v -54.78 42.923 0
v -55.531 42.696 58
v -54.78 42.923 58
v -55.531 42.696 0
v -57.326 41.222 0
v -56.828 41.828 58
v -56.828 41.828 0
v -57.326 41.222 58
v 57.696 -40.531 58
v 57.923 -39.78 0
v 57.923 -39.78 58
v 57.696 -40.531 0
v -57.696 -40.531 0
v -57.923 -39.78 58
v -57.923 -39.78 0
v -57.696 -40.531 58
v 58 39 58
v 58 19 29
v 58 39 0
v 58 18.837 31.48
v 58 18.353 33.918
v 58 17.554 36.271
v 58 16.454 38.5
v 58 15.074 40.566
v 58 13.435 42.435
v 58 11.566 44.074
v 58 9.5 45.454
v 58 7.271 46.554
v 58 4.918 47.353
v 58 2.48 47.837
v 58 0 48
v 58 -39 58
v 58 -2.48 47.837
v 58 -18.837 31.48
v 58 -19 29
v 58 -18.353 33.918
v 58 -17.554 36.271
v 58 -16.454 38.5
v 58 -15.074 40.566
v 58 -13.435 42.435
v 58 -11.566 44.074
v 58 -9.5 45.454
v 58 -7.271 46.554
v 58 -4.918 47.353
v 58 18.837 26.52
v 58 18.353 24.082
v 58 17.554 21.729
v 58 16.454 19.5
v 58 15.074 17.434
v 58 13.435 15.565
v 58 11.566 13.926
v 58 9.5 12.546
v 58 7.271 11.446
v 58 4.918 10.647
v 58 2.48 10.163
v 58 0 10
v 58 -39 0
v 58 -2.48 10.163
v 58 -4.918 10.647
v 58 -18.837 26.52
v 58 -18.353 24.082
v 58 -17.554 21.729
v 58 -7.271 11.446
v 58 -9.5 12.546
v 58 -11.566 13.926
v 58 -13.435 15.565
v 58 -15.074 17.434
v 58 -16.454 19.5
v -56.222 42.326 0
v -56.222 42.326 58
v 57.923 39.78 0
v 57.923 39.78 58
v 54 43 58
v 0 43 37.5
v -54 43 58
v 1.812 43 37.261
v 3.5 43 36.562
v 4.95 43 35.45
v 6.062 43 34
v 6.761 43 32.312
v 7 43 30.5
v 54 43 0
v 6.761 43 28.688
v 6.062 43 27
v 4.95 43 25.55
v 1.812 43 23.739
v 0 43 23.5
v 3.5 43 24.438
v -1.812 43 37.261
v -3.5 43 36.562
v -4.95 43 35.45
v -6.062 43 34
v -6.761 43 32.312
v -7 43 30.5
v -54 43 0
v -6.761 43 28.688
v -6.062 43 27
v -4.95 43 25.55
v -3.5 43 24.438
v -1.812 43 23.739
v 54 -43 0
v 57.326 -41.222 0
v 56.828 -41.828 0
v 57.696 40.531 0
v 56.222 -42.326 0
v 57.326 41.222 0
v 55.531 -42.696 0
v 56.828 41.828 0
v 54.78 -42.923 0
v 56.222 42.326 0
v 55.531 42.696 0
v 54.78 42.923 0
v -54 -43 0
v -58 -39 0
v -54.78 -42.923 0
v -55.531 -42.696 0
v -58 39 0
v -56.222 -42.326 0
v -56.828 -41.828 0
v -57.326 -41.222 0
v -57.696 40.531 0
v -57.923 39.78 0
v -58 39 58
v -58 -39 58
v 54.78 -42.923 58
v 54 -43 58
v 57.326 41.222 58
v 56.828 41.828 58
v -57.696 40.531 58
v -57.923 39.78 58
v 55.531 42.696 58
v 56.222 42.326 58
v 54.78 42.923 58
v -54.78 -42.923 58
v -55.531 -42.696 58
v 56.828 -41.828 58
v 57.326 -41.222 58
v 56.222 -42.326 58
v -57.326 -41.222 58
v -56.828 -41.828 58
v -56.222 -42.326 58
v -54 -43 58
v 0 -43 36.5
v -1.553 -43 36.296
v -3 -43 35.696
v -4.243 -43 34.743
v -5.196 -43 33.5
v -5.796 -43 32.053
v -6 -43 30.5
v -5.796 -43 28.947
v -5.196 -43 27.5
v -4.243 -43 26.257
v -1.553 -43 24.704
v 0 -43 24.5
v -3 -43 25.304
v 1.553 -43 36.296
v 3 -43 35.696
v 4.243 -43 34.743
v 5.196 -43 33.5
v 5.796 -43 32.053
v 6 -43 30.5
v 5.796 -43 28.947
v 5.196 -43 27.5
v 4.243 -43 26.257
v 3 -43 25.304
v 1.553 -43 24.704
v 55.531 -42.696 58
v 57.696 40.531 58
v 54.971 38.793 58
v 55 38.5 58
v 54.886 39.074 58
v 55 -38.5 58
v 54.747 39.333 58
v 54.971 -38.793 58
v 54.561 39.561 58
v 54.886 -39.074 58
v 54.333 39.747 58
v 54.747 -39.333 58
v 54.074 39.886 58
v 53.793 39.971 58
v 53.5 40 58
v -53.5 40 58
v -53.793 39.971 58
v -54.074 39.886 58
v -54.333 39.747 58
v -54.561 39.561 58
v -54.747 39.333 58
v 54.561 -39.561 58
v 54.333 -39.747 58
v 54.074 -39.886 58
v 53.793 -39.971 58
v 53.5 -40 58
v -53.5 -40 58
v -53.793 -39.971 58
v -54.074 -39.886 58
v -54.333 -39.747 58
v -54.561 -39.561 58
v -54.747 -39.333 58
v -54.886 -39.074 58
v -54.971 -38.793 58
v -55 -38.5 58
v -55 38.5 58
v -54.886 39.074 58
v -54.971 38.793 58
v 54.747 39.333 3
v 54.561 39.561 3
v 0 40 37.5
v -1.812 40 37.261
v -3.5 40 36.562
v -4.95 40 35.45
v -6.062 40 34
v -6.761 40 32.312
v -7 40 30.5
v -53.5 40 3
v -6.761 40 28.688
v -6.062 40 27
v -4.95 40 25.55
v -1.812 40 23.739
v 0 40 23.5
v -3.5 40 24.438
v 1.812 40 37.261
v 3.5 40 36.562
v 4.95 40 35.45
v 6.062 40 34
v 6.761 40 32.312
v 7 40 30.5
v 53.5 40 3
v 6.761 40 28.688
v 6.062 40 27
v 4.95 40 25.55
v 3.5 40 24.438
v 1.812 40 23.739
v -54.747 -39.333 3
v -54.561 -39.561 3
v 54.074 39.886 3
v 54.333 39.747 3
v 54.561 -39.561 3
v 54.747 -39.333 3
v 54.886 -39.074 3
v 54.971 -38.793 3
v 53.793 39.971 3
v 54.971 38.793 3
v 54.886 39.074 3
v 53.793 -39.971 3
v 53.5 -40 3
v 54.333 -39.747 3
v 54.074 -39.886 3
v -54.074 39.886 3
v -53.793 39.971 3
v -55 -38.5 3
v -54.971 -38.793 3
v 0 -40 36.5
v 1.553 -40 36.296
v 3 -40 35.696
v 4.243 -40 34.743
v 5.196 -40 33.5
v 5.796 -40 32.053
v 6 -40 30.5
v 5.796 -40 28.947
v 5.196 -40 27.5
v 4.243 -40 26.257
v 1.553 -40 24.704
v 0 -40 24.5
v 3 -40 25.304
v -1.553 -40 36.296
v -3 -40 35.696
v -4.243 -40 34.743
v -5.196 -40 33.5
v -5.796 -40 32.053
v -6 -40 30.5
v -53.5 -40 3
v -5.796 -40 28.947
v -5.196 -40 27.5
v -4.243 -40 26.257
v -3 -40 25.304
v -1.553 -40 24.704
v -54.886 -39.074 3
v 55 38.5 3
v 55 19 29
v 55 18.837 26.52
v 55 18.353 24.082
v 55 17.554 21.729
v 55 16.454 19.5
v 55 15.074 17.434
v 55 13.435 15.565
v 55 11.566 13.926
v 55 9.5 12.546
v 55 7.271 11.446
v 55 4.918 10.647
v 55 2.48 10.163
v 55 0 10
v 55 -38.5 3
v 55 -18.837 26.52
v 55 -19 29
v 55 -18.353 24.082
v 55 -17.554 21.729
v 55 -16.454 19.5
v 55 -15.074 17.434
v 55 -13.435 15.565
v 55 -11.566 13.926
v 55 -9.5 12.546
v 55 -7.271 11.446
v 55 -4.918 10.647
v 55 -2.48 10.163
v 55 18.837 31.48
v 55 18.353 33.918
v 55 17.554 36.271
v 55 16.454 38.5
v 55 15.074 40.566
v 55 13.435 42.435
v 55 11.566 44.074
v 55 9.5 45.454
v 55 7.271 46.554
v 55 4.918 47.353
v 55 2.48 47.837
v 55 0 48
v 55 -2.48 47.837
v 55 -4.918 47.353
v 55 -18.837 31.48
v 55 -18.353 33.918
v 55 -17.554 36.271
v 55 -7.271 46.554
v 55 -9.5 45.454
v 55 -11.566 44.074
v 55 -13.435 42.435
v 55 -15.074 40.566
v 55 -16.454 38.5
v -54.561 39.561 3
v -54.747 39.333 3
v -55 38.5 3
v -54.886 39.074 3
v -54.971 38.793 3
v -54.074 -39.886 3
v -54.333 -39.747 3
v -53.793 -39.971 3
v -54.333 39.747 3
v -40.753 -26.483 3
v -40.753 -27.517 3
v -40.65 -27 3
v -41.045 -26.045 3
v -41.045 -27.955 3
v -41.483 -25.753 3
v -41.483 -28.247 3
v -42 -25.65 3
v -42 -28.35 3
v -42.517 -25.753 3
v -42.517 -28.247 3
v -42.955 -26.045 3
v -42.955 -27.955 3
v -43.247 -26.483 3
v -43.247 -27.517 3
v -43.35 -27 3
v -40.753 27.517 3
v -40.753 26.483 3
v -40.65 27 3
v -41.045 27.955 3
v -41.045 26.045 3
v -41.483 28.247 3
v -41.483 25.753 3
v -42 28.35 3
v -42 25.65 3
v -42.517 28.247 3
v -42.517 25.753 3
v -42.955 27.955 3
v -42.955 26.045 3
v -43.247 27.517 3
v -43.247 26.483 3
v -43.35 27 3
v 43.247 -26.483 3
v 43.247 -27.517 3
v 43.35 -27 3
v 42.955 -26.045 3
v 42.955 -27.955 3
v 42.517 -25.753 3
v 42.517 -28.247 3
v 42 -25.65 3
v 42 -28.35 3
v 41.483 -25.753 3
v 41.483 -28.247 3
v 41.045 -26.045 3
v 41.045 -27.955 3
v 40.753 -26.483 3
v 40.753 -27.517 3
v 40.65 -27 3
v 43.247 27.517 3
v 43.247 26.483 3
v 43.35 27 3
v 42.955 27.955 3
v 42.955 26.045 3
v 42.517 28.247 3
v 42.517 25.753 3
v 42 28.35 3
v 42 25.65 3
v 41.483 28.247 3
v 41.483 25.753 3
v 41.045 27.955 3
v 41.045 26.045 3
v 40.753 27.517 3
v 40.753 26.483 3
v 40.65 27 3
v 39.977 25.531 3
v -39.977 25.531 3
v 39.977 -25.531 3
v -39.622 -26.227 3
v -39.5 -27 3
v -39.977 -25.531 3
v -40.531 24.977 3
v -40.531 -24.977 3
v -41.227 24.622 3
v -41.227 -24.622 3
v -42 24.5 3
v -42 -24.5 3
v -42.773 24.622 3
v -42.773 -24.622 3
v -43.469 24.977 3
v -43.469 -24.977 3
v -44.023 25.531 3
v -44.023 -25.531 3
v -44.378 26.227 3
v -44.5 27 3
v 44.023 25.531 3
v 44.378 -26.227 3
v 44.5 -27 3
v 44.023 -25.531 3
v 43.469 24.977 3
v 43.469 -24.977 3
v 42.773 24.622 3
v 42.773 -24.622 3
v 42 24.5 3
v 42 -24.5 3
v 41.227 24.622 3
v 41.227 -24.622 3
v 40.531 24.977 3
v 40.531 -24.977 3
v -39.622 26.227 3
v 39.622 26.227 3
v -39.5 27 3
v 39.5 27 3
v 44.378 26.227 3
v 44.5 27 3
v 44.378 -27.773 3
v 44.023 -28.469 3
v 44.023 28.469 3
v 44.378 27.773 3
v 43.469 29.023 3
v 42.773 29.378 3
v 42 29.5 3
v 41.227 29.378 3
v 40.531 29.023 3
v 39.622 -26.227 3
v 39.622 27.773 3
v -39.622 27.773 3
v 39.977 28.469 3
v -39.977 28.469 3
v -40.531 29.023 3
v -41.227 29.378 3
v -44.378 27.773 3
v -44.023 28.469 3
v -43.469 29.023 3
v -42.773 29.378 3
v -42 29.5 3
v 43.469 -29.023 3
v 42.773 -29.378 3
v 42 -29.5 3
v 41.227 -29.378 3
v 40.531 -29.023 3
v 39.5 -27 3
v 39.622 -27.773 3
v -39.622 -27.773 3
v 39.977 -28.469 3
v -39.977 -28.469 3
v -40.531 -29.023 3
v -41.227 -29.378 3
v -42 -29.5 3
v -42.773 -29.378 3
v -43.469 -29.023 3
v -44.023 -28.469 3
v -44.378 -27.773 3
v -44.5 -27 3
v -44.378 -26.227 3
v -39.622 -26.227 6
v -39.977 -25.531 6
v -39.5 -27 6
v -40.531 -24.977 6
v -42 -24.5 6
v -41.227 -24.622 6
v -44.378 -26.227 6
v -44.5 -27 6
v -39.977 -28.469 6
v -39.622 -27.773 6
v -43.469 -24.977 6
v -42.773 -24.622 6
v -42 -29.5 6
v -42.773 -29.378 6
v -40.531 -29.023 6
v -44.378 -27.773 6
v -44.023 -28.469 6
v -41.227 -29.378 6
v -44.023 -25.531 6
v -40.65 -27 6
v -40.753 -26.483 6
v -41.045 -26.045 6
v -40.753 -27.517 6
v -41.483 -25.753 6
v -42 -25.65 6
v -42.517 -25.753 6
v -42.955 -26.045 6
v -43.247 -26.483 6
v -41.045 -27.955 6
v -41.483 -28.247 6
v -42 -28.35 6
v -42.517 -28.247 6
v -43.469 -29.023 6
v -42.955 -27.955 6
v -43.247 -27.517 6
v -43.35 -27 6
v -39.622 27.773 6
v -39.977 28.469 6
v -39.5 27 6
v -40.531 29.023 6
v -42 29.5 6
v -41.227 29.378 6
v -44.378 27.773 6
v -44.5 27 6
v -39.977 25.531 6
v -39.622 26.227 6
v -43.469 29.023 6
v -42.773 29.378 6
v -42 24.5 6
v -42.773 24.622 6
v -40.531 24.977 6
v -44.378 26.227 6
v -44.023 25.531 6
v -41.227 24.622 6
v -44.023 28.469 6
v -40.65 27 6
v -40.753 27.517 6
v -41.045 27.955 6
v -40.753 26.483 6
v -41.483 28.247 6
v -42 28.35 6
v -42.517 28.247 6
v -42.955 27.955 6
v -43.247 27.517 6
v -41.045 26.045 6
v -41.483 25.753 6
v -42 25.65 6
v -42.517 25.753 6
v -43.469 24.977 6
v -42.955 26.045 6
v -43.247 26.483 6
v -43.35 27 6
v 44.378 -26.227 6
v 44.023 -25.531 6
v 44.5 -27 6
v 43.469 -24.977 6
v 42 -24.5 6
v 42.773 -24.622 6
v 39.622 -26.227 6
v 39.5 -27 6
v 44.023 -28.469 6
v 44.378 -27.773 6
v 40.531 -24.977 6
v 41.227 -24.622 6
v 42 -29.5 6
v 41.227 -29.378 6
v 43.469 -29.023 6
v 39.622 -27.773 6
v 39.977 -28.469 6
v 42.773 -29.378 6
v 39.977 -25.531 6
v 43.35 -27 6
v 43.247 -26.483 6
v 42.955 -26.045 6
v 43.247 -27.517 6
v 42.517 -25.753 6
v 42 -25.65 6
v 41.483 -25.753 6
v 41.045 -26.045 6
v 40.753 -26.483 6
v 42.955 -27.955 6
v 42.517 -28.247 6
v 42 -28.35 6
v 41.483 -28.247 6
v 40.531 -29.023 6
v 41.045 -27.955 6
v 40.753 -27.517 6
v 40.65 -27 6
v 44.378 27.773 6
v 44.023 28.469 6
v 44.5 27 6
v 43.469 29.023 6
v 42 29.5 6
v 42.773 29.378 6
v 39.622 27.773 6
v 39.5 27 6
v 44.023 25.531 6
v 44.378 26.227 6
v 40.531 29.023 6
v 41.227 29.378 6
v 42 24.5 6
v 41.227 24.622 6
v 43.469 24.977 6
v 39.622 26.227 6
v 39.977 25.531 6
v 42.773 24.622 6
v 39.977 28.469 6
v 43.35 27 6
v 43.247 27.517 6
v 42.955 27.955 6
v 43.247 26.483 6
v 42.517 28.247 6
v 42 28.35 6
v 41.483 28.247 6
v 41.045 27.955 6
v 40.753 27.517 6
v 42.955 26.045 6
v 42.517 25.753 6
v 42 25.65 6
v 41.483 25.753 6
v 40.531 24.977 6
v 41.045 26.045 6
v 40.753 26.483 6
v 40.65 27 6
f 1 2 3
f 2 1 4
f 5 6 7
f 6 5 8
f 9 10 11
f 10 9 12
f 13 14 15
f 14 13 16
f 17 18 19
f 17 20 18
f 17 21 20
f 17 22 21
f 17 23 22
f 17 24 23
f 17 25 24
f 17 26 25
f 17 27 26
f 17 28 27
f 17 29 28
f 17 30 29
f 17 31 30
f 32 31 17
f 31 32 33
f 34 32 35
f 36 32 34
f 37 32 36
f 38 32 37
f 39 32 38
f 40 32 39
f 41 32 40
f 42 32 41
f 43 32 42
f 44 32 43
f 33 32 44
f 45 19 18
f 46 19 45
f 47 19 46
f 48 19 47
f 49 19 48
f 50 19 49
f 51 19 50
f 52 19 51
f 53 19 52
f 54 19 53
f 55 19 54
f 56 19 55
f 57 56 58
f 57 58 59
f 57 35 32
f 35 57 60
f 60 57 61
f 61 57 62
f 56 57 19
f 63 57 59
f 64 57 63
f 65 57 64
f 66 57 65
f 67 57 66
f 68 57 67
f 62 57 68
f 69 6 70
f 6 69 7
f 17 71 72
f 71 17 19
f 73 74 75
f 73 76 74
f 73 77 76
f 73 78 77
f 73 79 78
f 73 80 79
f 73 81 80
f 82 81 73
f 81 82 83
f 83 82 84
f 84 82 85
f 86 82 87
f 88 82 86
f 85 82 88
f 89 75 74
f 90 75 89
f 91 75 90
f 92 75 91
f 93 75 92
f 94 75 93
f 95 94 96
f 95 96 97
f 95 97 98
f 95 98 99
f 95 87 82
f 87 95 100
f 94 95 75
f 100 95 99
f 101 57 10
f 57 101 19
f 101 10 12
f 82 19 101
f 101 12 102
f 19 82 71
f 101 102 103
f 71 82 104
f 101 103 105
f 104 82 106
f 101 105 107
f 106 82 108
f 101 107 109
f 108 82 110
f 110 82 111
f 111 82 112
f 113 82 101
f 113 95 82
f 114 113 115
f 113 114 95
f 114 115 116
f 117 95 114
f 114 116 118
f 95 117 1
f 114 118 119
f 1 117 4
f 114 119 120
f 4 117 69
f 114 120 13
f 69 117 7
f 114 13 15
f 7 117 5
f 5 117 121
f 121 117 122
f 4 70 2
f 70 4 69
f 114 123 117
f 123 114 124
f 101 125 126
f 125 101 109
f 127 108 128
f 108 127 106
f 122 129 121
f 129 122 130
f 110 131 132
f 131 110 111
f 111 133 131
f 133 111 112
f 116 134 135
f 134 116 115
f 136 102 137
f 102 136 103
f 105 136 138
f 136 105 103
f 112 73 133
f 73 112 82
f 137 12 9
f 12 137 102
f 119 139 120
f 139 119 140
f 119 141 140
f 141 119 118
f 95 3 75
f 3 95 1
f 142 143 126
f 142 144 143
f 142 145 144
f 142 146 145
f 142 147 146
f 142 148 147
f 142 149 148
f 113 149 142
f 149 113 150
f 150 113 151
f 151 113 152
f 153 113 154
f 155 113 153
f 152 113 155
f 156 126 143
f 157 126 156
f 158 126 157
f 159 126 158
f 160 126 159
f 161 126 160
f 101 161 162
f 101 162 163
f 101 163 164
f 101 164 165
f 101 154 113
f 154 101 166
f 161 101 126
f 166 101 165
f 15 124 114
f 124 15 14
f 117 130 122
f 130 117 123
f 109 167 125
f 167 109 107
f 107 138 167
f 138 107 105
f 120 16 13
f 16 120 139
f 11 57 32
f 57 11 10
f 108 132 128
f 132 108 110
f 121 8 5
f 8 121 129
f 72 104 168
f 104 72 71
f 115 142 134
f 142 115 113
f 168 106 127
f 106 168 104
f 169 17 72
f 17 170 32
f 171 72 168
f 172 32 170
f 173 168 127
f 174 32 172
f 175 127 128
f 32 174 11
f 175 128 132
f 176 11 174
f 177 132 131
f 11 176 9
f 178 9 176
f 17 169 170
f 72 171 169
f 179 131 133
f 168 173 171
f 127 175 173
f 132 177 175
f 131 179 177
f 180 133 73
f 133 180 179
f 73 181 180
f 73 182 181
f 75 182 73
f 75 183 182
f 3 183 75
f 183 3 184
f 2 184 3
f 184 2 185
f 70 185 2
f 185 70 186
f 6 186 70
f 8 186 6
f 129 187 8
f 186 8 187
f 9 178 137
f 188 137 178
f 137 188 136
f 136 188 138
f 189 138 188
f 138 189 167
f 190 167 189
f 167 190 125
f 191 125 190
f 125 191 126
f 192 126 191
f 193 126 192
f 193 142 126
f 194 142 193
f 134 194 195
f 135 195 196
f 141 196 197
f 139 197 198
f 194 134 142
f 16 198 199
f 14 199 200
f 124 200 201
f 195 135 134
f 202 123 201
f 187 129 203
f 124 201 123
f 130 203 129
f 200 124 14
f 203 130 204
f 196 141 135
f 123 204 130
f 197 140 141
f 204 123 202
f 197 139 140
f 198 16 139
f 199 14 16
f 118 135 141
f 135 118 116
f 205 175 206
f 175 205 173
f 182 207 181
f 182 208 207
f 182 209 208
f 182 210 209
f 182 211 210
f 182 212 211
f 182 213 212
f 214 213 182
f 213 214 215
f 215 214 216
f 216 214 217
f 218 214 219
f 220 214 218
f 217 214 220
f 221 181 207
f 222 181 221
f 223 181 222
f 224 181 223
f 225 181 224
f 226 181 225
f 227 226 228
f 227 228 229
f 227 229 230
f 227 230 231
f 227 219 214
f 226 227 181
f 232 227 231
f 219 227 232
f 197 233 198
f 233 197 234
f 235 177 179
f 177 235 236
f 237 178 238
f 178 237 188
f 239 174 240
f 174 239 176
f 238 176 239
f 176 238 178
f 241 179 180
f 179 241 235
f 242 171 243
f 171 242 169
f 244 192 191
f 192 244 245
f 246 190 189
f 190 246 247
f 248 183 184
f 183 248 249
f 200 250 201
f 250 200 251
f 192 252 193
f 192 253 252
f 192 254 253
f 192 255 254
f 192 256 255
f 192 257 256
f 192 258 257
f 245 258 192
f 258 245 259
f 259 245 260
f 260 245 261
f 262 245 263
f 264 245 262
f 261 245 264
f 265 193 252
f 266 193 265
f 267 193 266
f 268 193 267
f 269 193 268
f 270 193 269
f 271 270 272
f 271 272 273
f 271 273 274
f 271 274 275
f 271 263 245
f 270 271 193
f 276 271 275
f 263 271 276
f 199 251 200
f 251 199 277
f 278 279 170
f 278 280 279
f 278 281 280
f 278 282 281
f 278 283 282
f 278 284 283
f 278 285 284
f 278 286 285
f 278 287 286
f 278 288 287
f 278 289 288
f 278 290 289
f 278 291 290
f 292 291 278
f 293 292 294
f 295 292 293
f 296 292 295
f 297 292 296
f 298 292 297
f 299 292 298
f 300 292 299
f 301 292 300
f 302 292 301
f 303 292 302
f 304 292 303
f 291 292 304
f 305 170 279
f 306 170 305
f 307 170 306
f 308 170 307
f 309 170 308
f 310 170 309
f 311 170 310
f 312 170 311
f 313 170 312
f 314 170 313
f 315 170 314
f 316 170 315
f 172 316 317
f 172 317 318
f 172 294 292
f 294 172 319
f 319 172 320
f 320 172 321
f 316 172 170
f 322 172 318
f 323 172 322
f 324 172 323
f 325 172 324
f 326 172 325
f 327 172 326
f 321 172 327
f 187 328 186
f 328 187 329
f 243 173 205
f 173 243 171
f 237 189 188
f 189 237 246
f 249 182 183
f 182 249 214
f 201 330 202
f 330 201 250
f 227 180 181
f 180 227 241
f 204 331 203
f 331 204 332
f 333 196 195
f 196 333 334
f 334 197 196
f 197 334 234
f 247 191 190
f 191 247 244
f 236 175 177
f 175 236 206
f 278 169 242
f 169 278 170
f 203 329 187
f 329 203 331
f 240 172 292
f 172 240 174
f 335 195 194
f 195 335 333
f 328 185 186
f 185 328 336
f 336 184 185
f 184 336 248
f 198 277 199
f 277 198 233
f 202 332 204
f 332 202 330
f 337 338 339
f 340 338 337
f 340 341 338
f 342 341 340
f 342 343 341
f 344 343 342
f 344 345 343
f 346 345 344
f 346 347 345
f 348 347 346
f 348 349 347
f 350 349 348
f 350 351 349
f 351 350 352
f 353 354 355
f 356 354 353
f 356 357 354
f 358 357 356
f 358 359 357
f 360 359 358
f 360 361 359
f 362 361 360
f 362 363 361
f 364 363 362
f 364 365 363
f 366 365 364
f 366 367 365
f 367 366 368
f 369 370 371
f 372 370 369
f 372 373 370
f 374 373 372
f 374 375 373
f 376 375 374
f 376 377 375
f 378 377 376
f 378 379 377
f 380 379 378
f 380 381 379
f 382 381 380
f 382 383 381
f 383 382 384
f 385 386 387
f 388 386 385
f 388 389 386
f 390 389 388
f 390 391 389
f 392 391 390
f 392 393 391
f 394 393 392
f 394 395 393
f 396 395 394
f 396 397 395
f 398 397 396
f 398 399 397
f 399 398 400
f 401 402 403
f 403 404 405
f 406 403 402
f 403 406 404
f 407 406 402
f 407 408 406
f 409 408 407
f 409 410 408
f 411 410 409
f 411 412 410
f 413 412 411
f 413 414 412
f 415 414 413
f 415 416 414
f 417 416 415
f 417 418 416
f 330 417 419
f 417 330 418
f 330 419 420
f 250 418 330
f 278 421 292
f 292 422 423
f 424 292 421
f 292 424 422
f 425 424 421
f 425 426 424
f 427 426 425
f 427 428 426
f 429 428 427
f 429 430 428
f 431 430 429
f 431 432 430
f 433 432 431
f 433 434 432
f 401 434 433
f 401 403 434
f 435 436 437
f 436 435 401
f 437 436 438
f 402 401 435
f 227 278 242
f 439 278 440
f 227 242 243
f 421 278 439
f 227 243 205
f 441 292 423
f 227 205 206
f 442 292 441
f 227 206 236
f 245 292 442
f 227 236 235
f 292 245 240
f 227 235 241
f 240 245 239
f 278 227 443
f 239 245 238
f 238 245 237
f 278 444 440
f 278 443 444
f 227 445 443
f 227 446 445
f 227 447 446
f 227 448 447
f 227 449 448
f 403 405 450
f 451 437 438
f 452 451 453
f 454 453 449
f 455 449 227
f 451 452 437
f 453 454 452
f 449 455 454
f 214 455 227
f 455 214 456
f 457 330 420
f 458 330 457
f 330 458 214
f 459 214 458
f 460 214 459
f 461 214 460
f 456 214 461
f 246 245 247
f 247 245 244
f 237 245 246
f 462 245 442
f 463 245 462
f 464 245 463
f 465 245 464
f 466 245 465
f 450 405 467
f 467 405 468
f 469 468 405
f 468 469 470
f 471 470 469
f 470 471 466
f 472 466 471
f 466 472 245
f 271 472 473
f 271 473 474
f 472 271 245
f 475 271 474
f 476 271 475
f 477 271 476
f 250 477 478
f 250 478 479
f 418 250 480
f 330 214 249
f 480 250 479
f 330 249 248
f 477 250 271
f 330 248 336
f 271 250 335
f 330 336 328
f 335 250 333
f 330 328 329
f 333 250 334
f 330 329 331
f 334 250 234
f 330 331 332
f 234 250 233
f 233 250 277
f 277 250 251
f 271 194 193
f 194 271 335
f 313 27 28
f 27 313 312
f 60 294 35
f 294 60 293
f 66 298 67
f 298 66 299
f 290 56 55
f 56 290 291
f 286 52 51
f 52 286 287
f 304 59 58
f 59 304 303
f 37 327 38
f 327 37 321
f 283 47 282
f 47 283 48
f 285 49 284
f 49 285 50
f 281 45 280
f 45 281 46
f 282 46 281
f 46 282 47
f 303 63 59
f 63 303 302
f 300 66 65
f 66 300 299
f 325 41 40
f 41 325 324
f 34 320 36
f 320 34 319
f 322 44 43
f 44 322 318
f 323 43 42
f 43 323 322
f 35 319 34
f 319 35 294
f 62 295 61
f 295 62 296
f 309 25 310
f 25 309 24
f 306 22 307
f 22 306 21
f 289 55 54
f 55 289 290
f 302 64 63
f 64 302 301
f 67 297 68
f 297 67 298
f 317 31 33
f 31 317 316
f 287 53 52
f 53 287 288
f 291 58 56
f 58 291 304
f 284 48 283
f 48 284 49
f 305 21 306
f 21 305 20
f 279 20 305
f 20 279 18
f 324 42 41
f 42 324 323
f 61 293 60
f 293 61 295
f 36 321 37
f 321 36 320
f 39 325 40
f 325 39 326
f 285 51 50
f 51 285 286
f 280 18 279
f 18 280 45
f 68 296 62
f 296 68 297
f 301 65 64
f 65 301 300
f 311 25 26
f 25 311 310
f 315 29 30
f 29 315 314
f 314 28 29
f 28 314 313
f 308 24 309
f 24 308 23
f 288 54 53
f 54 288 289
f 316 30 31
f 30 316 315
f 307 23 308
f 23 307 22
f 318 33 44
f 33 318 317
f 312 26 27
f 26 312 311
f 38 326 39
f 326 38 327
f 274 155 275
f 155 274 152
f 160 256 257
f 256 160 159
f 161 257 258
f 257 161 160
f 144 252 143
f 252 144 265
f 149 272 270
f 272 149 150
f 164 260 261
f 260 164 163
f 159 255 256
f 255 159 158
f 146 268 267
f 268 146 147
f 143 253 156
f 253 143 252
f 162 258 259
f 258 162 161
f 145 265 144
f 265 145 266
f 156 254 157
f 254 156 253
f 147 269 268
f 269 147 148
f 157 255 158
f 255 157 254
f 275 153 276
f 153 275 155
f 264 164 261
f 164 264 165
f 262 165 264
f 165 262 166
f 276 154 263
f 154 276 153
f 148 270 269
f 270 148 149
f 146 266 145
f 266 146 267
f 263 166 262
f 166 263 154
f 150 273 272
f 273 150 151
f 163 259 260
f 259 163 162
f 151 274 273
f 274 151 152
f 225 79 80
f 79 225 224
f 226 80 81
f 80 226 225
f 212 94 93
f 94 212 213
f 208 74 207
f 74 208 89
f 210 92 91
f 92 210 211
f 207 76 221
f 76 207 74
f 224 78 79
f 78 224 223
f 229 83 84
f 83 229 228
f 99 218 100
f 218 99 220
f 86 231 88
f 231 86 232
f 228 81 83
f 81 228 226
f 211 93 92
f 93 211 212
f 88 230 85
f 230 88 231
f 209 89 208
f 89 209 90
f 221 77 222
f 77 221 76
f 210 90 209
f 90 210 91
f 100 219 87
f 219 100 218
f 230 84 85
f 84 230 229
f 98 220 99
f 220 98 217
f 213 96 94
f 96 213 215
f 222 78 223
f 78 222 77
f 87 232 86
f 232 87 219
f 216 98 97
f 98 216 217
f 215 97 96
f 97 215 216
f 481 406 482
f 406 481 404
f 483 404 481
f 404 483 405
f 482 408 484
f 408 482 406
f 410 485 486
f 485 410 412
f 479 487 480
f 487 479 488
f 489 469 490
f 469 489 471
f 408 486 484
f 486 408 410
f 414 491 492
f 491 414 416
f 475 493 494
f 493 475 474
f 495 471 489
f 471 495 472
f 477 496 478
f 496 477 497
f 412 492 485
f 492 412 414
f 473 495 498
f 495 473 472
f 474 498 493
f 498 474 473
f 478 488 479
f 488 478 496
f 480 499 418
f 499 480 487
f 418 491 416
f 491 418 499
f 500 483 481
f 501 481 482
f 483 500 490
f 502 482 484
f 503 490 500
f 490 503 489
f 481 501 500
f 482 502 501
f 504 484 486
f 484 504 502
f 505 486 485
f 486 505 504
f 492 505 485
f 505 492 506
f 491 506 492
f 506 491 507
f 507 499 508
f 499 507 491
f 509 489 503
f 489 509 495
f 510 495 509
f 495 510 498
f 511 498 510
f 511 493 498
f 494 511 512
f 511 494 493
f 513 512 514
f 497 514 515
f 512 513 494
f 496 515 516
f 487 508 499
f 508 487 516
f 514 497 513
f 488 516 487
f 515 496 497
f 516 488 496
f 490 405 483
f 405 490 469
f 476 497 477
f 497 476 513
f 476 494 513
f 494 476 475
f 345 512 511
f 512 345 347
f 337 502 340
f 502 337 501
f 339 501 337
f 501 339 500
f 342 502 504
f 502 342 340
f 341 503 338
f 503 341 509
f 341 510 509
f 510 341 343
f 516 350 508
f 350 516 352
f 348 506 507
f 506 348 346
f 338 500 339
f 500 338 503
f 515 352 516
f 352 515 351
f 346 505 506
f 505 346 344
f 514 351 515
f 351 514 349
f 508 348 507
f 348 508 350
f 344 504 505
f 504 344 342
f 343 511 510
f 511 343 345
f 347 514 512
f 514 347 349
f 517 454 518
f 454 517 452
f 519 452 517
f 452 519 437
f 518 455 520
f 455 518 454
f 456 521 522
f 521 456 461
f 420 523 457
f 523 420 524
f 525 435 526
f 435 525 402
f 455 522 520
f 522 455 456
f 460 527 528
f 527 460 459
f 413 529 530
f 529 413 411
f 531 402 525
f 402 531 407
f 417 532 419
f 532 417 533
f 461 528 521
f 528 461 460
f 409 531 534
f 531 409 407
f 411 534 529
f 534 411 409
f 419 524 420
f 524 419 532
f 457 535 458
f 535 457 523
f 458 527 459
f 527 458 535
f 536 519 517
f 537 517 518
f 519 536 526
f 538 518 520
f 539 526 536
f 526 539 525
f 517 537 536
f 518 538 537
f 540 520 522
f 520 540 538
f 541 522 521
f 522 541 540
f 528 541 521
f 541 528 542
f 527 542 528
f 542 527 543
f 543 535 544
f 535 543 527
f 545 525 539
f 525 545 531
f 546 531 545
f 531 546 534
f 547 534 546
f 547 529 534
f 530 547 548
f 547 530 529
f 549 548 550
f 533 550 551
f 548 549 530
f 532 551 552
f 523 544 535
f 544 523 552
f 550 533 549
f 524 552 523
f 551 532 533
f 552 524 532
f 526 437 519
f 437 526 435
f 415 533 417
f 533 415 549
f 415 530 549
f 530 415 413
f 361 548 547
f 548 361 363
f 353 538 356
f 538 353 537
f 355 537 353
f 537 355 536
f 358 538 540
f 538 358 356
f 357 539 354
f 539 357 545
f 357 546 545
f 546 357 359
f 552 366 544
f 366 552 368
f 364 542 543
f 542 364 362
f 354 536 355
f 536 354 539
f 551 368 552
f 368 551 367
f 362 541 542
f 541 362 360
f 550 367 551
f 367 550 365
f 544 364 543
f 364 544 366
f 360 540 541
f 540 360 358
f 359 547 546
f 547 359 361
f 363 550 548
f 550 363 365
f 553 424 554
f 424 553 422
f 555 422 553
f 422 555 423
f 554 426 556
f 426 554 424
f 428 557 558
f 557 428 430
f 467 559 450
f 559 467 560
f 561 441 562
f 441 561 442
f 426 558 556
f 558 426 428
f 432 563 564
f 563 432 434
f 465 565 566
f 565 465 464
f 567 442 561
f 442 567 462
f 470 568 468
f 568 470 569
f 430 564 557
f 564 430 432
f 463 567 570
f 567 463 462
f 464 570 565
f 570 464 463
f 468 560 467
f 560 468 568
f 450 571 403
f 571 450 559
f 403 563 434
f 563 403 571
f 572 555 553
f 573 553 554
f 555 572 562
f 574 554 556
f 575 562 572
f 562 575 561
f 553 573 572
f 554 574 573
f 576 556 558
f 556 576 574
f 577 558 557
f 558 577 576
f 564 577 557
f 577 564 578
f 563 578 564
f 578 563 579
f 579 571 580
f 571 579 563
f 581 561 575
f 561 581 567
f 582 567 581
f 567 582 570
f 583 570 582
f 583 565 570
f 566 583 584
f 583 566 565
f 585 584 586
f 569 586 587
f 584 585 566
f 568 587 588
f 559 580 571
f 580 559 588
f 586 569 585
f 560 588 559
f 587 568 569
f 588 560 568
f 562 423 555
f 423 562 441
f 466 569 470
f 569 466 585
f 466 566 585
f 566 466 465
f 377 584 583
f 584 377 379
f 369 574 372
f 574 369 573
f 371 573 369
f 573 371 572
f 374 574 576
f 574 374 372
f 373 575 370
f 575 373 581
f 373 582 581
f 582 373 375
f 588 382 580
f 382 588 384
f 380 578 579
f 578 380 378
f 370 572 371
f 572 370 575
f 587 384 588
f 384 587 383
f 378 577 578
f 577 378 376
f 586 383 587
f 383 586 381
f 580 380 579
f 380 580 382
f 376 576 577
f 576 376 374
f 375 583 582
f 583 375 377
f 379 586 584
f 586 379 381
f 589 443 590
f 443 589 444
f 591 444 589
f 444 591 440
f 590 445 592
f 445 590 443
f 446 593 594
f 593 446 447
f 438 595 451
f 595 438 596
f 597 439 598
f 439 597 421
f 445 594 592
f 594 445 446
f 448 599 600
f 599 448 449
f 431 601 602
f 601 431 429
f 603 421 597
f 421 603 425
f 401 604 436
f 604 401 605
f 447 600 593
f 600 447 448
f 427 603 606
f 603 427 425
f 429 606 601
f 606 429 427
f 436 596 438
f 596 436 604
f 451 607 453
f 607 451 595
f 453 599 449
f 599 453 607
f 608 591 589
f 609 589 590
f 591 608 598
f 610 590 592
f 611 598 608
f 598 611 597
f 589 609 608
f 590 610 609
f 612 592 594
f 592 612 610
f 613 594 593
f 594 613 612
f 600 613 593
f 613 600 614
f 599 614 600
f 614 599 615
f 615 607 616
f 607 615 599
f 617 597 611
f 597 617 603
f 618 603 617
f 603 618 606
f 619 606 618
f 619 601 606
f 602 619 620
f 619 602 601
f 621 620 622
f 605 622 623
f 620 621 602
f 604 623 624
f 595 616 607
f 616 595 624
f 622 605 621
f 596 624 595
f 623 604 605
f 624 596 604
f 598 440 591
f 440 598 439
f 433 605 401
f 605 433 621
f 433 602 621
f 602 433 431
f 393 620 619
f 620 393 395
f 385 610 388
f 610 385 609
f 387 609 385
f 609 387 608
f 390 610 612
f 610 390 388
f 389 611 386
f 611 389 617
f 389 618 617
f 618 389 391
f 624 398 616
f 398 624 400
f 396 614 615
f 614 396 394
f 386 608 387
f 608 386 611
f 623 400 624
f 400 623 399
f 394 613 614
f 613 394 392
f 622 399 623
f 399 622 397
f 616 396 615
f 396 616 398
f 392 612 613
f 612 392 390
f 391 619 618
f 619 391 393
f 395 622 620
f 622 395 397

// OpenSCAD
// ===========================================================================
// HULL-FRAME COORDINATE STANDARD - Rev R1 (2026-06-11).  See CLAUDE.md.
//   Hull frame (canonical for ALL design artifacts): X = +port (left),
//   Y = +aft (back), Z = +dorsal (up); origin = SerenityAssembly.FCStd
//   world origin.  Primary-component STLs published to airframe/stls/
//   are stored directly in hull frame, baked by tools/bake_hull_frame.py
//   (marker 'SerenityUAV HULL-FRAME R1' in the binary STL header).
//   NEVER re-bake a mesh derived from an already-baked file.
//   This file:
//     Skipper ground-support equipment - part-local print frame.  The
//     aircraft hull-frame standard does not apply to GCS hardware
//     (documented exception, like the avionics KiCad files).
// ===========================================================================
/*
 * skipper_field_enclosure.scad
 * IP65 weatherproof field enclosure for Skipper GCS comms node
 * (PocketBeagle 2 Industrial + TACCO + XCVR-49MHZ-2 stack)
 *
 * Author:  Steve Griffing, PE(CSE), CISSP-ISSEP, CPP
 * License: CERN-OHL-W-2.0 — see LICENSES/CERN-OHL-W 2.0 (SPDX-License-Identifier: CERN-OHL-W-2.0)
 * Revision: R (2026-06-11)
 *
 * Description:
 *   Two-part (lid + body) enclosure for Skipper's comms node.  The interior
 *   fits the PB2-I + TACCO + XCVR-49MHZ-2 stack on standoffs, a 40 mm
 *   cooling fan, and cable gland locations for RF, USB, power, and servo
 *   feedthroughs.  The lid is retained by M3 screws with a perimeter EPDM
 *   gasket for IP65 ingress protection.
 *
 *   NOTE: This design uses standard off-the-shelf components where possible.
 *   If a commercial Hammond 1590XX or similar IP65 aluminum enclosure fits the
 *   stack, prefer that over a printed enclosure to save weight and print time.
 *   See skipper_power_budget.md and skipper_wiring.md for stack dimensions.
 *
 * Stack envelope (Cape-B-2 + PB2-I + XCVR-49MHZ-2):
 *   Footprint: 90 mm × 60 mm
 *   Height:    29 mm (Cape-B-2 PCB 1.6 mm + M2.5×6 standoffs + PB2-I 6 mm board
 *              + M2.5×20 inter-cape standoffs + XCVR 8 mm) ≈ 42 mm total stack
 *   Board clearance below: 3 mm standoff feet
 *   Board clearance above: 8 mm lid clearance
 *   Total interior height needed: 3 + 42 + 8 = 53 mm
 *
 * Mesh verification: run after every geometry change.
 *   openscad -o skipper_field_enclosure.stl skipper_field_enclosure.scad
 *   python3 tools/validate_stls.py
 */

/* ---------------------------------------------------------------------------
 * Render mode: 0 = body only, 1 = lid only, 2 = exploded assembly view
 * ---------------------------------------------------------------------------*/
RENDER_MODE = 0;

/* ---------------------------------------------------------------------------
 * Interior dimensions (must fit stack + fan + cable routing)
 * ---------------------------------------------------------------------------*/
INT_W   = 110;      /* Interior width  (X) mm — 90mm stack + 10mm margin each side */
INT_D   = 80;       /* Interior depth  (Y) mm — 60mm stack + 10mm margin each side */
INT_H   = 55;       /* Interior height (Z) mm — see stack height calculation above  */

/* ---------------------------------------------------------------------------
 * Wall and lid geometry
 * ---------------------------------------------------------------------------*/
WALL_T      = 3.0;  /* Wall thickness mm — 3mm PETG adequate for weather seal */
LID_T       = 3.0;  /* Lid panel thickness mm                                  */
GASKET_W    = 4.0;  /* EPDM gasket groove width mm                             */
GASKET_D    = 2.0;  /* EPDM gasket groove depth mm (gasket 3mm dia compresses) */
CORNER_R    = 4.0;  /* Exterior corner radius mm                               */
SCREW_PITCH = 40.0; /* Lid screw pattern — one M3 screw every 40mm along rim   */

/* ---------------------------------------------------------------------------
 * Fan cutout (40 mm axial cooling fan in body wall)
 * ---------------------------------------------------------------------------*/
FAN_SIZE    = 40.0; /* Fan frame size mm (standard 40×40mm fan)                */
FAN_HOLE_D  = 38.0; /* Fan airflow opening diameter mm                         */
FAN_SCREW   = 32.0; /* Fan mounting screw hole pitch mm (32mm for 40mm fan)    */
FAN_SCREW_D = 3.5;  /* Fan mounting screw clearance diameter mm (M3)           */

/* ---------------------------------------------------------------------------
 * Cable gland locations (centred on body walls)
 * Z-position = gland centre height from floor (inside face)
 * ---------------------------------------------------------------------------*/
USB_GLAND_Z     = INT_H / 2;   /* USB-C gland on front wall — mid-height      */
PWR_GLAND_Z     = INT_H / 2;   /* Power XT30 gland on rear wall               */
RF_GLAND_Z      = INT_H * 0.7; /* 5× SMA glands on right wall — upper zone    */
SERVO_GLAND_Z   = INT_H * 0.3; /* Multi-pin servo/I2C connector on left wall  */

/* ---------------------------------------------------------------------------
 * Standoff pattern for TACCO PCB (55×35mm, M2.5 holes)
 * Origin at floor centre of interior.
 * ---------------------------------------------------------------------------*/
STAND_H     = 3.0;  /* Standoff height off floor mm                           */
STAND_OD    = 5.0;  /* Standoff outer diameter mm                             */
STAND_ID    = 2.7;  /* M2.5 clearance bore mm                                 */
PCB_W       = 90.0; /* TACCO PCB width mm                                  */
PCB_D       = 60.0; /* TACCO PCB depth mm                                  */
PCB_MOUNT_X = PCB_W / 2 - 3;   /* PCB mounting hole inset from edge mm        */
PCB_MOUNT_Y = PCB_D / 2 - 3;

/* ============================================================================
 * Derived dimensions
 * ============================================================================*/
EXT_W = INT_W + 2 * WALL_T;    /* Total exterior width  */
EXT_D = INT_D + 2 * WALL_T;    /* Total exterior depth  */
EXT_H = INT_H + WALL_T;        /* Body height (no lid)  */

module rounded_box(w, d, h, r) {
    /*
     * Solid rounded-corner cuboid for exterior shell subtraction.
     * w = width (X), d = depth (Y), h = height (Z), r = corner radius.
     */
    hull() {
        for (xi = [-1, 1]) {
            for (yi = [-1, 1]) {
                translate([xi * (w / 2 - r), yi * (d / 2 - r), 0]) {
                    cylinder(r = r, h = h, $fn = 32);
                }
            }
        }
    }
}

module pcb_standoff(x, y) {
    /*
     * Single M2.5 boss standoff at (x, y) from PCB origin.
     * Standoff is a cylinder with a central clearance bore.
     */
    translate([x, y, 0]) {
        difference() {
            cylinder(d = STAND_OD, h = STAND_H, $fn = 20);
            cylinder(d = STAND_ID, h = STAND_H + 0.1, $fn = 16);
        }
    }
}

module enclosure_body() {
    /*
     * Body (open-top box) with PCB standoffs, fan cutout, and cable gland bosses.
     * Lid seats on the top flange; EPDM gasket groove runs around the perimeter.
     */
    difference() {
        /* --- Exterior solid --- */
        rounded_box(EXT_W, EXT_D, EXT_H, CORNER_R);

        /* --- Interior pocket --- */
        translate([0, 0, WALL_T]) {
            rounded_box(INT_W, INT_D, EXT_H, CORNER_R - WALL_T + 0.5);
        }

        /* --- Fan cutout in +X wall (right side) --- */
        translate([EXT_W / 2, 0, EXT_H / 2]) {
            rotate([0, 90, 0]) {
                cylinder(d = FAN_HOLE_D, h = WALL_T * 2 + 1, center = true, $fn = 48);
            }
        }

        /* --- USB-C gland cutout in -Y wall (front) — placeholder 12mm dia --- */
        translate([0, -EXT_D / 2, USB_GLAND_Z + WALL_T]) {
            rotate([90, 0, 0]) {
                cylinder(d = 12, h = WALL_T * 2 + 1, center = true, $fn = 24);
            }
        }

        /* --- Power gland cutout in +Y wall (rear) — placeholder 14mm dia --- */
        translate([0, EXT_D / 2, PWR_GLAND_Z + WALL_T]) {
            rotate([90, 0, 0]) {
                cylinder(d = 14, h = WALL_T * 2 + 1, center = true, $fn = 24);
            }
        }
    }

    /* --- PCB standoffs on floor --- */
    translate([0, 0, WALL_T]) {
        for (sx = [-PCB_MOUNT_X, PCB_MOUNT_X]) {
            for (sy = [-PCB_MOUNT_Y, PCB_MOUNT_Y]) {
                pcb_standoff(sx, sy);
            }
        }
    }
}

module enclosure_lid() {
    /*
     * Flat lid with perimeter EPDM gasket groove and M3 screw clearance holes.
     * Lid thickness = LID_T; seats on top flange of body.
     */
    difference() {
        /* --- Lid solid --- */
        translate([0, 0, 0]) {
            rounded_box(EXT_W, EXT_D, LID_T, CORNER_R);
        }

        /* --- EPDM gasket groove around perimeter --- */
        difference() {
            rounded_box(EXT_W - WALL_T, EXT_D - WALL_T, GASKET_D + 0.1, CORNER_R - WALL_T / 2);
            rounded_box(EXT_W - WALL_T - 2 * GASKET_W, EXT_D - WALL_T - 2 * GASKET_W,
                        GASKET_D + 0.2, CORNER_R - WALL_T - GASKET_W / 2);
        }
    }
}

/* ============================================================================
 * Render dispatch
 * ============================================================================*/
if (RENDER_MODE == 0) {
    enclosure_body();
} else if (RENDER_MODE == 1) {
    enclosure_lid();
} else {
    /* Exploded assembly view */
    enclosure_body();
    translate([0, 0, EXT_H + 20]) {
        enclosure_lid();
    }
}
